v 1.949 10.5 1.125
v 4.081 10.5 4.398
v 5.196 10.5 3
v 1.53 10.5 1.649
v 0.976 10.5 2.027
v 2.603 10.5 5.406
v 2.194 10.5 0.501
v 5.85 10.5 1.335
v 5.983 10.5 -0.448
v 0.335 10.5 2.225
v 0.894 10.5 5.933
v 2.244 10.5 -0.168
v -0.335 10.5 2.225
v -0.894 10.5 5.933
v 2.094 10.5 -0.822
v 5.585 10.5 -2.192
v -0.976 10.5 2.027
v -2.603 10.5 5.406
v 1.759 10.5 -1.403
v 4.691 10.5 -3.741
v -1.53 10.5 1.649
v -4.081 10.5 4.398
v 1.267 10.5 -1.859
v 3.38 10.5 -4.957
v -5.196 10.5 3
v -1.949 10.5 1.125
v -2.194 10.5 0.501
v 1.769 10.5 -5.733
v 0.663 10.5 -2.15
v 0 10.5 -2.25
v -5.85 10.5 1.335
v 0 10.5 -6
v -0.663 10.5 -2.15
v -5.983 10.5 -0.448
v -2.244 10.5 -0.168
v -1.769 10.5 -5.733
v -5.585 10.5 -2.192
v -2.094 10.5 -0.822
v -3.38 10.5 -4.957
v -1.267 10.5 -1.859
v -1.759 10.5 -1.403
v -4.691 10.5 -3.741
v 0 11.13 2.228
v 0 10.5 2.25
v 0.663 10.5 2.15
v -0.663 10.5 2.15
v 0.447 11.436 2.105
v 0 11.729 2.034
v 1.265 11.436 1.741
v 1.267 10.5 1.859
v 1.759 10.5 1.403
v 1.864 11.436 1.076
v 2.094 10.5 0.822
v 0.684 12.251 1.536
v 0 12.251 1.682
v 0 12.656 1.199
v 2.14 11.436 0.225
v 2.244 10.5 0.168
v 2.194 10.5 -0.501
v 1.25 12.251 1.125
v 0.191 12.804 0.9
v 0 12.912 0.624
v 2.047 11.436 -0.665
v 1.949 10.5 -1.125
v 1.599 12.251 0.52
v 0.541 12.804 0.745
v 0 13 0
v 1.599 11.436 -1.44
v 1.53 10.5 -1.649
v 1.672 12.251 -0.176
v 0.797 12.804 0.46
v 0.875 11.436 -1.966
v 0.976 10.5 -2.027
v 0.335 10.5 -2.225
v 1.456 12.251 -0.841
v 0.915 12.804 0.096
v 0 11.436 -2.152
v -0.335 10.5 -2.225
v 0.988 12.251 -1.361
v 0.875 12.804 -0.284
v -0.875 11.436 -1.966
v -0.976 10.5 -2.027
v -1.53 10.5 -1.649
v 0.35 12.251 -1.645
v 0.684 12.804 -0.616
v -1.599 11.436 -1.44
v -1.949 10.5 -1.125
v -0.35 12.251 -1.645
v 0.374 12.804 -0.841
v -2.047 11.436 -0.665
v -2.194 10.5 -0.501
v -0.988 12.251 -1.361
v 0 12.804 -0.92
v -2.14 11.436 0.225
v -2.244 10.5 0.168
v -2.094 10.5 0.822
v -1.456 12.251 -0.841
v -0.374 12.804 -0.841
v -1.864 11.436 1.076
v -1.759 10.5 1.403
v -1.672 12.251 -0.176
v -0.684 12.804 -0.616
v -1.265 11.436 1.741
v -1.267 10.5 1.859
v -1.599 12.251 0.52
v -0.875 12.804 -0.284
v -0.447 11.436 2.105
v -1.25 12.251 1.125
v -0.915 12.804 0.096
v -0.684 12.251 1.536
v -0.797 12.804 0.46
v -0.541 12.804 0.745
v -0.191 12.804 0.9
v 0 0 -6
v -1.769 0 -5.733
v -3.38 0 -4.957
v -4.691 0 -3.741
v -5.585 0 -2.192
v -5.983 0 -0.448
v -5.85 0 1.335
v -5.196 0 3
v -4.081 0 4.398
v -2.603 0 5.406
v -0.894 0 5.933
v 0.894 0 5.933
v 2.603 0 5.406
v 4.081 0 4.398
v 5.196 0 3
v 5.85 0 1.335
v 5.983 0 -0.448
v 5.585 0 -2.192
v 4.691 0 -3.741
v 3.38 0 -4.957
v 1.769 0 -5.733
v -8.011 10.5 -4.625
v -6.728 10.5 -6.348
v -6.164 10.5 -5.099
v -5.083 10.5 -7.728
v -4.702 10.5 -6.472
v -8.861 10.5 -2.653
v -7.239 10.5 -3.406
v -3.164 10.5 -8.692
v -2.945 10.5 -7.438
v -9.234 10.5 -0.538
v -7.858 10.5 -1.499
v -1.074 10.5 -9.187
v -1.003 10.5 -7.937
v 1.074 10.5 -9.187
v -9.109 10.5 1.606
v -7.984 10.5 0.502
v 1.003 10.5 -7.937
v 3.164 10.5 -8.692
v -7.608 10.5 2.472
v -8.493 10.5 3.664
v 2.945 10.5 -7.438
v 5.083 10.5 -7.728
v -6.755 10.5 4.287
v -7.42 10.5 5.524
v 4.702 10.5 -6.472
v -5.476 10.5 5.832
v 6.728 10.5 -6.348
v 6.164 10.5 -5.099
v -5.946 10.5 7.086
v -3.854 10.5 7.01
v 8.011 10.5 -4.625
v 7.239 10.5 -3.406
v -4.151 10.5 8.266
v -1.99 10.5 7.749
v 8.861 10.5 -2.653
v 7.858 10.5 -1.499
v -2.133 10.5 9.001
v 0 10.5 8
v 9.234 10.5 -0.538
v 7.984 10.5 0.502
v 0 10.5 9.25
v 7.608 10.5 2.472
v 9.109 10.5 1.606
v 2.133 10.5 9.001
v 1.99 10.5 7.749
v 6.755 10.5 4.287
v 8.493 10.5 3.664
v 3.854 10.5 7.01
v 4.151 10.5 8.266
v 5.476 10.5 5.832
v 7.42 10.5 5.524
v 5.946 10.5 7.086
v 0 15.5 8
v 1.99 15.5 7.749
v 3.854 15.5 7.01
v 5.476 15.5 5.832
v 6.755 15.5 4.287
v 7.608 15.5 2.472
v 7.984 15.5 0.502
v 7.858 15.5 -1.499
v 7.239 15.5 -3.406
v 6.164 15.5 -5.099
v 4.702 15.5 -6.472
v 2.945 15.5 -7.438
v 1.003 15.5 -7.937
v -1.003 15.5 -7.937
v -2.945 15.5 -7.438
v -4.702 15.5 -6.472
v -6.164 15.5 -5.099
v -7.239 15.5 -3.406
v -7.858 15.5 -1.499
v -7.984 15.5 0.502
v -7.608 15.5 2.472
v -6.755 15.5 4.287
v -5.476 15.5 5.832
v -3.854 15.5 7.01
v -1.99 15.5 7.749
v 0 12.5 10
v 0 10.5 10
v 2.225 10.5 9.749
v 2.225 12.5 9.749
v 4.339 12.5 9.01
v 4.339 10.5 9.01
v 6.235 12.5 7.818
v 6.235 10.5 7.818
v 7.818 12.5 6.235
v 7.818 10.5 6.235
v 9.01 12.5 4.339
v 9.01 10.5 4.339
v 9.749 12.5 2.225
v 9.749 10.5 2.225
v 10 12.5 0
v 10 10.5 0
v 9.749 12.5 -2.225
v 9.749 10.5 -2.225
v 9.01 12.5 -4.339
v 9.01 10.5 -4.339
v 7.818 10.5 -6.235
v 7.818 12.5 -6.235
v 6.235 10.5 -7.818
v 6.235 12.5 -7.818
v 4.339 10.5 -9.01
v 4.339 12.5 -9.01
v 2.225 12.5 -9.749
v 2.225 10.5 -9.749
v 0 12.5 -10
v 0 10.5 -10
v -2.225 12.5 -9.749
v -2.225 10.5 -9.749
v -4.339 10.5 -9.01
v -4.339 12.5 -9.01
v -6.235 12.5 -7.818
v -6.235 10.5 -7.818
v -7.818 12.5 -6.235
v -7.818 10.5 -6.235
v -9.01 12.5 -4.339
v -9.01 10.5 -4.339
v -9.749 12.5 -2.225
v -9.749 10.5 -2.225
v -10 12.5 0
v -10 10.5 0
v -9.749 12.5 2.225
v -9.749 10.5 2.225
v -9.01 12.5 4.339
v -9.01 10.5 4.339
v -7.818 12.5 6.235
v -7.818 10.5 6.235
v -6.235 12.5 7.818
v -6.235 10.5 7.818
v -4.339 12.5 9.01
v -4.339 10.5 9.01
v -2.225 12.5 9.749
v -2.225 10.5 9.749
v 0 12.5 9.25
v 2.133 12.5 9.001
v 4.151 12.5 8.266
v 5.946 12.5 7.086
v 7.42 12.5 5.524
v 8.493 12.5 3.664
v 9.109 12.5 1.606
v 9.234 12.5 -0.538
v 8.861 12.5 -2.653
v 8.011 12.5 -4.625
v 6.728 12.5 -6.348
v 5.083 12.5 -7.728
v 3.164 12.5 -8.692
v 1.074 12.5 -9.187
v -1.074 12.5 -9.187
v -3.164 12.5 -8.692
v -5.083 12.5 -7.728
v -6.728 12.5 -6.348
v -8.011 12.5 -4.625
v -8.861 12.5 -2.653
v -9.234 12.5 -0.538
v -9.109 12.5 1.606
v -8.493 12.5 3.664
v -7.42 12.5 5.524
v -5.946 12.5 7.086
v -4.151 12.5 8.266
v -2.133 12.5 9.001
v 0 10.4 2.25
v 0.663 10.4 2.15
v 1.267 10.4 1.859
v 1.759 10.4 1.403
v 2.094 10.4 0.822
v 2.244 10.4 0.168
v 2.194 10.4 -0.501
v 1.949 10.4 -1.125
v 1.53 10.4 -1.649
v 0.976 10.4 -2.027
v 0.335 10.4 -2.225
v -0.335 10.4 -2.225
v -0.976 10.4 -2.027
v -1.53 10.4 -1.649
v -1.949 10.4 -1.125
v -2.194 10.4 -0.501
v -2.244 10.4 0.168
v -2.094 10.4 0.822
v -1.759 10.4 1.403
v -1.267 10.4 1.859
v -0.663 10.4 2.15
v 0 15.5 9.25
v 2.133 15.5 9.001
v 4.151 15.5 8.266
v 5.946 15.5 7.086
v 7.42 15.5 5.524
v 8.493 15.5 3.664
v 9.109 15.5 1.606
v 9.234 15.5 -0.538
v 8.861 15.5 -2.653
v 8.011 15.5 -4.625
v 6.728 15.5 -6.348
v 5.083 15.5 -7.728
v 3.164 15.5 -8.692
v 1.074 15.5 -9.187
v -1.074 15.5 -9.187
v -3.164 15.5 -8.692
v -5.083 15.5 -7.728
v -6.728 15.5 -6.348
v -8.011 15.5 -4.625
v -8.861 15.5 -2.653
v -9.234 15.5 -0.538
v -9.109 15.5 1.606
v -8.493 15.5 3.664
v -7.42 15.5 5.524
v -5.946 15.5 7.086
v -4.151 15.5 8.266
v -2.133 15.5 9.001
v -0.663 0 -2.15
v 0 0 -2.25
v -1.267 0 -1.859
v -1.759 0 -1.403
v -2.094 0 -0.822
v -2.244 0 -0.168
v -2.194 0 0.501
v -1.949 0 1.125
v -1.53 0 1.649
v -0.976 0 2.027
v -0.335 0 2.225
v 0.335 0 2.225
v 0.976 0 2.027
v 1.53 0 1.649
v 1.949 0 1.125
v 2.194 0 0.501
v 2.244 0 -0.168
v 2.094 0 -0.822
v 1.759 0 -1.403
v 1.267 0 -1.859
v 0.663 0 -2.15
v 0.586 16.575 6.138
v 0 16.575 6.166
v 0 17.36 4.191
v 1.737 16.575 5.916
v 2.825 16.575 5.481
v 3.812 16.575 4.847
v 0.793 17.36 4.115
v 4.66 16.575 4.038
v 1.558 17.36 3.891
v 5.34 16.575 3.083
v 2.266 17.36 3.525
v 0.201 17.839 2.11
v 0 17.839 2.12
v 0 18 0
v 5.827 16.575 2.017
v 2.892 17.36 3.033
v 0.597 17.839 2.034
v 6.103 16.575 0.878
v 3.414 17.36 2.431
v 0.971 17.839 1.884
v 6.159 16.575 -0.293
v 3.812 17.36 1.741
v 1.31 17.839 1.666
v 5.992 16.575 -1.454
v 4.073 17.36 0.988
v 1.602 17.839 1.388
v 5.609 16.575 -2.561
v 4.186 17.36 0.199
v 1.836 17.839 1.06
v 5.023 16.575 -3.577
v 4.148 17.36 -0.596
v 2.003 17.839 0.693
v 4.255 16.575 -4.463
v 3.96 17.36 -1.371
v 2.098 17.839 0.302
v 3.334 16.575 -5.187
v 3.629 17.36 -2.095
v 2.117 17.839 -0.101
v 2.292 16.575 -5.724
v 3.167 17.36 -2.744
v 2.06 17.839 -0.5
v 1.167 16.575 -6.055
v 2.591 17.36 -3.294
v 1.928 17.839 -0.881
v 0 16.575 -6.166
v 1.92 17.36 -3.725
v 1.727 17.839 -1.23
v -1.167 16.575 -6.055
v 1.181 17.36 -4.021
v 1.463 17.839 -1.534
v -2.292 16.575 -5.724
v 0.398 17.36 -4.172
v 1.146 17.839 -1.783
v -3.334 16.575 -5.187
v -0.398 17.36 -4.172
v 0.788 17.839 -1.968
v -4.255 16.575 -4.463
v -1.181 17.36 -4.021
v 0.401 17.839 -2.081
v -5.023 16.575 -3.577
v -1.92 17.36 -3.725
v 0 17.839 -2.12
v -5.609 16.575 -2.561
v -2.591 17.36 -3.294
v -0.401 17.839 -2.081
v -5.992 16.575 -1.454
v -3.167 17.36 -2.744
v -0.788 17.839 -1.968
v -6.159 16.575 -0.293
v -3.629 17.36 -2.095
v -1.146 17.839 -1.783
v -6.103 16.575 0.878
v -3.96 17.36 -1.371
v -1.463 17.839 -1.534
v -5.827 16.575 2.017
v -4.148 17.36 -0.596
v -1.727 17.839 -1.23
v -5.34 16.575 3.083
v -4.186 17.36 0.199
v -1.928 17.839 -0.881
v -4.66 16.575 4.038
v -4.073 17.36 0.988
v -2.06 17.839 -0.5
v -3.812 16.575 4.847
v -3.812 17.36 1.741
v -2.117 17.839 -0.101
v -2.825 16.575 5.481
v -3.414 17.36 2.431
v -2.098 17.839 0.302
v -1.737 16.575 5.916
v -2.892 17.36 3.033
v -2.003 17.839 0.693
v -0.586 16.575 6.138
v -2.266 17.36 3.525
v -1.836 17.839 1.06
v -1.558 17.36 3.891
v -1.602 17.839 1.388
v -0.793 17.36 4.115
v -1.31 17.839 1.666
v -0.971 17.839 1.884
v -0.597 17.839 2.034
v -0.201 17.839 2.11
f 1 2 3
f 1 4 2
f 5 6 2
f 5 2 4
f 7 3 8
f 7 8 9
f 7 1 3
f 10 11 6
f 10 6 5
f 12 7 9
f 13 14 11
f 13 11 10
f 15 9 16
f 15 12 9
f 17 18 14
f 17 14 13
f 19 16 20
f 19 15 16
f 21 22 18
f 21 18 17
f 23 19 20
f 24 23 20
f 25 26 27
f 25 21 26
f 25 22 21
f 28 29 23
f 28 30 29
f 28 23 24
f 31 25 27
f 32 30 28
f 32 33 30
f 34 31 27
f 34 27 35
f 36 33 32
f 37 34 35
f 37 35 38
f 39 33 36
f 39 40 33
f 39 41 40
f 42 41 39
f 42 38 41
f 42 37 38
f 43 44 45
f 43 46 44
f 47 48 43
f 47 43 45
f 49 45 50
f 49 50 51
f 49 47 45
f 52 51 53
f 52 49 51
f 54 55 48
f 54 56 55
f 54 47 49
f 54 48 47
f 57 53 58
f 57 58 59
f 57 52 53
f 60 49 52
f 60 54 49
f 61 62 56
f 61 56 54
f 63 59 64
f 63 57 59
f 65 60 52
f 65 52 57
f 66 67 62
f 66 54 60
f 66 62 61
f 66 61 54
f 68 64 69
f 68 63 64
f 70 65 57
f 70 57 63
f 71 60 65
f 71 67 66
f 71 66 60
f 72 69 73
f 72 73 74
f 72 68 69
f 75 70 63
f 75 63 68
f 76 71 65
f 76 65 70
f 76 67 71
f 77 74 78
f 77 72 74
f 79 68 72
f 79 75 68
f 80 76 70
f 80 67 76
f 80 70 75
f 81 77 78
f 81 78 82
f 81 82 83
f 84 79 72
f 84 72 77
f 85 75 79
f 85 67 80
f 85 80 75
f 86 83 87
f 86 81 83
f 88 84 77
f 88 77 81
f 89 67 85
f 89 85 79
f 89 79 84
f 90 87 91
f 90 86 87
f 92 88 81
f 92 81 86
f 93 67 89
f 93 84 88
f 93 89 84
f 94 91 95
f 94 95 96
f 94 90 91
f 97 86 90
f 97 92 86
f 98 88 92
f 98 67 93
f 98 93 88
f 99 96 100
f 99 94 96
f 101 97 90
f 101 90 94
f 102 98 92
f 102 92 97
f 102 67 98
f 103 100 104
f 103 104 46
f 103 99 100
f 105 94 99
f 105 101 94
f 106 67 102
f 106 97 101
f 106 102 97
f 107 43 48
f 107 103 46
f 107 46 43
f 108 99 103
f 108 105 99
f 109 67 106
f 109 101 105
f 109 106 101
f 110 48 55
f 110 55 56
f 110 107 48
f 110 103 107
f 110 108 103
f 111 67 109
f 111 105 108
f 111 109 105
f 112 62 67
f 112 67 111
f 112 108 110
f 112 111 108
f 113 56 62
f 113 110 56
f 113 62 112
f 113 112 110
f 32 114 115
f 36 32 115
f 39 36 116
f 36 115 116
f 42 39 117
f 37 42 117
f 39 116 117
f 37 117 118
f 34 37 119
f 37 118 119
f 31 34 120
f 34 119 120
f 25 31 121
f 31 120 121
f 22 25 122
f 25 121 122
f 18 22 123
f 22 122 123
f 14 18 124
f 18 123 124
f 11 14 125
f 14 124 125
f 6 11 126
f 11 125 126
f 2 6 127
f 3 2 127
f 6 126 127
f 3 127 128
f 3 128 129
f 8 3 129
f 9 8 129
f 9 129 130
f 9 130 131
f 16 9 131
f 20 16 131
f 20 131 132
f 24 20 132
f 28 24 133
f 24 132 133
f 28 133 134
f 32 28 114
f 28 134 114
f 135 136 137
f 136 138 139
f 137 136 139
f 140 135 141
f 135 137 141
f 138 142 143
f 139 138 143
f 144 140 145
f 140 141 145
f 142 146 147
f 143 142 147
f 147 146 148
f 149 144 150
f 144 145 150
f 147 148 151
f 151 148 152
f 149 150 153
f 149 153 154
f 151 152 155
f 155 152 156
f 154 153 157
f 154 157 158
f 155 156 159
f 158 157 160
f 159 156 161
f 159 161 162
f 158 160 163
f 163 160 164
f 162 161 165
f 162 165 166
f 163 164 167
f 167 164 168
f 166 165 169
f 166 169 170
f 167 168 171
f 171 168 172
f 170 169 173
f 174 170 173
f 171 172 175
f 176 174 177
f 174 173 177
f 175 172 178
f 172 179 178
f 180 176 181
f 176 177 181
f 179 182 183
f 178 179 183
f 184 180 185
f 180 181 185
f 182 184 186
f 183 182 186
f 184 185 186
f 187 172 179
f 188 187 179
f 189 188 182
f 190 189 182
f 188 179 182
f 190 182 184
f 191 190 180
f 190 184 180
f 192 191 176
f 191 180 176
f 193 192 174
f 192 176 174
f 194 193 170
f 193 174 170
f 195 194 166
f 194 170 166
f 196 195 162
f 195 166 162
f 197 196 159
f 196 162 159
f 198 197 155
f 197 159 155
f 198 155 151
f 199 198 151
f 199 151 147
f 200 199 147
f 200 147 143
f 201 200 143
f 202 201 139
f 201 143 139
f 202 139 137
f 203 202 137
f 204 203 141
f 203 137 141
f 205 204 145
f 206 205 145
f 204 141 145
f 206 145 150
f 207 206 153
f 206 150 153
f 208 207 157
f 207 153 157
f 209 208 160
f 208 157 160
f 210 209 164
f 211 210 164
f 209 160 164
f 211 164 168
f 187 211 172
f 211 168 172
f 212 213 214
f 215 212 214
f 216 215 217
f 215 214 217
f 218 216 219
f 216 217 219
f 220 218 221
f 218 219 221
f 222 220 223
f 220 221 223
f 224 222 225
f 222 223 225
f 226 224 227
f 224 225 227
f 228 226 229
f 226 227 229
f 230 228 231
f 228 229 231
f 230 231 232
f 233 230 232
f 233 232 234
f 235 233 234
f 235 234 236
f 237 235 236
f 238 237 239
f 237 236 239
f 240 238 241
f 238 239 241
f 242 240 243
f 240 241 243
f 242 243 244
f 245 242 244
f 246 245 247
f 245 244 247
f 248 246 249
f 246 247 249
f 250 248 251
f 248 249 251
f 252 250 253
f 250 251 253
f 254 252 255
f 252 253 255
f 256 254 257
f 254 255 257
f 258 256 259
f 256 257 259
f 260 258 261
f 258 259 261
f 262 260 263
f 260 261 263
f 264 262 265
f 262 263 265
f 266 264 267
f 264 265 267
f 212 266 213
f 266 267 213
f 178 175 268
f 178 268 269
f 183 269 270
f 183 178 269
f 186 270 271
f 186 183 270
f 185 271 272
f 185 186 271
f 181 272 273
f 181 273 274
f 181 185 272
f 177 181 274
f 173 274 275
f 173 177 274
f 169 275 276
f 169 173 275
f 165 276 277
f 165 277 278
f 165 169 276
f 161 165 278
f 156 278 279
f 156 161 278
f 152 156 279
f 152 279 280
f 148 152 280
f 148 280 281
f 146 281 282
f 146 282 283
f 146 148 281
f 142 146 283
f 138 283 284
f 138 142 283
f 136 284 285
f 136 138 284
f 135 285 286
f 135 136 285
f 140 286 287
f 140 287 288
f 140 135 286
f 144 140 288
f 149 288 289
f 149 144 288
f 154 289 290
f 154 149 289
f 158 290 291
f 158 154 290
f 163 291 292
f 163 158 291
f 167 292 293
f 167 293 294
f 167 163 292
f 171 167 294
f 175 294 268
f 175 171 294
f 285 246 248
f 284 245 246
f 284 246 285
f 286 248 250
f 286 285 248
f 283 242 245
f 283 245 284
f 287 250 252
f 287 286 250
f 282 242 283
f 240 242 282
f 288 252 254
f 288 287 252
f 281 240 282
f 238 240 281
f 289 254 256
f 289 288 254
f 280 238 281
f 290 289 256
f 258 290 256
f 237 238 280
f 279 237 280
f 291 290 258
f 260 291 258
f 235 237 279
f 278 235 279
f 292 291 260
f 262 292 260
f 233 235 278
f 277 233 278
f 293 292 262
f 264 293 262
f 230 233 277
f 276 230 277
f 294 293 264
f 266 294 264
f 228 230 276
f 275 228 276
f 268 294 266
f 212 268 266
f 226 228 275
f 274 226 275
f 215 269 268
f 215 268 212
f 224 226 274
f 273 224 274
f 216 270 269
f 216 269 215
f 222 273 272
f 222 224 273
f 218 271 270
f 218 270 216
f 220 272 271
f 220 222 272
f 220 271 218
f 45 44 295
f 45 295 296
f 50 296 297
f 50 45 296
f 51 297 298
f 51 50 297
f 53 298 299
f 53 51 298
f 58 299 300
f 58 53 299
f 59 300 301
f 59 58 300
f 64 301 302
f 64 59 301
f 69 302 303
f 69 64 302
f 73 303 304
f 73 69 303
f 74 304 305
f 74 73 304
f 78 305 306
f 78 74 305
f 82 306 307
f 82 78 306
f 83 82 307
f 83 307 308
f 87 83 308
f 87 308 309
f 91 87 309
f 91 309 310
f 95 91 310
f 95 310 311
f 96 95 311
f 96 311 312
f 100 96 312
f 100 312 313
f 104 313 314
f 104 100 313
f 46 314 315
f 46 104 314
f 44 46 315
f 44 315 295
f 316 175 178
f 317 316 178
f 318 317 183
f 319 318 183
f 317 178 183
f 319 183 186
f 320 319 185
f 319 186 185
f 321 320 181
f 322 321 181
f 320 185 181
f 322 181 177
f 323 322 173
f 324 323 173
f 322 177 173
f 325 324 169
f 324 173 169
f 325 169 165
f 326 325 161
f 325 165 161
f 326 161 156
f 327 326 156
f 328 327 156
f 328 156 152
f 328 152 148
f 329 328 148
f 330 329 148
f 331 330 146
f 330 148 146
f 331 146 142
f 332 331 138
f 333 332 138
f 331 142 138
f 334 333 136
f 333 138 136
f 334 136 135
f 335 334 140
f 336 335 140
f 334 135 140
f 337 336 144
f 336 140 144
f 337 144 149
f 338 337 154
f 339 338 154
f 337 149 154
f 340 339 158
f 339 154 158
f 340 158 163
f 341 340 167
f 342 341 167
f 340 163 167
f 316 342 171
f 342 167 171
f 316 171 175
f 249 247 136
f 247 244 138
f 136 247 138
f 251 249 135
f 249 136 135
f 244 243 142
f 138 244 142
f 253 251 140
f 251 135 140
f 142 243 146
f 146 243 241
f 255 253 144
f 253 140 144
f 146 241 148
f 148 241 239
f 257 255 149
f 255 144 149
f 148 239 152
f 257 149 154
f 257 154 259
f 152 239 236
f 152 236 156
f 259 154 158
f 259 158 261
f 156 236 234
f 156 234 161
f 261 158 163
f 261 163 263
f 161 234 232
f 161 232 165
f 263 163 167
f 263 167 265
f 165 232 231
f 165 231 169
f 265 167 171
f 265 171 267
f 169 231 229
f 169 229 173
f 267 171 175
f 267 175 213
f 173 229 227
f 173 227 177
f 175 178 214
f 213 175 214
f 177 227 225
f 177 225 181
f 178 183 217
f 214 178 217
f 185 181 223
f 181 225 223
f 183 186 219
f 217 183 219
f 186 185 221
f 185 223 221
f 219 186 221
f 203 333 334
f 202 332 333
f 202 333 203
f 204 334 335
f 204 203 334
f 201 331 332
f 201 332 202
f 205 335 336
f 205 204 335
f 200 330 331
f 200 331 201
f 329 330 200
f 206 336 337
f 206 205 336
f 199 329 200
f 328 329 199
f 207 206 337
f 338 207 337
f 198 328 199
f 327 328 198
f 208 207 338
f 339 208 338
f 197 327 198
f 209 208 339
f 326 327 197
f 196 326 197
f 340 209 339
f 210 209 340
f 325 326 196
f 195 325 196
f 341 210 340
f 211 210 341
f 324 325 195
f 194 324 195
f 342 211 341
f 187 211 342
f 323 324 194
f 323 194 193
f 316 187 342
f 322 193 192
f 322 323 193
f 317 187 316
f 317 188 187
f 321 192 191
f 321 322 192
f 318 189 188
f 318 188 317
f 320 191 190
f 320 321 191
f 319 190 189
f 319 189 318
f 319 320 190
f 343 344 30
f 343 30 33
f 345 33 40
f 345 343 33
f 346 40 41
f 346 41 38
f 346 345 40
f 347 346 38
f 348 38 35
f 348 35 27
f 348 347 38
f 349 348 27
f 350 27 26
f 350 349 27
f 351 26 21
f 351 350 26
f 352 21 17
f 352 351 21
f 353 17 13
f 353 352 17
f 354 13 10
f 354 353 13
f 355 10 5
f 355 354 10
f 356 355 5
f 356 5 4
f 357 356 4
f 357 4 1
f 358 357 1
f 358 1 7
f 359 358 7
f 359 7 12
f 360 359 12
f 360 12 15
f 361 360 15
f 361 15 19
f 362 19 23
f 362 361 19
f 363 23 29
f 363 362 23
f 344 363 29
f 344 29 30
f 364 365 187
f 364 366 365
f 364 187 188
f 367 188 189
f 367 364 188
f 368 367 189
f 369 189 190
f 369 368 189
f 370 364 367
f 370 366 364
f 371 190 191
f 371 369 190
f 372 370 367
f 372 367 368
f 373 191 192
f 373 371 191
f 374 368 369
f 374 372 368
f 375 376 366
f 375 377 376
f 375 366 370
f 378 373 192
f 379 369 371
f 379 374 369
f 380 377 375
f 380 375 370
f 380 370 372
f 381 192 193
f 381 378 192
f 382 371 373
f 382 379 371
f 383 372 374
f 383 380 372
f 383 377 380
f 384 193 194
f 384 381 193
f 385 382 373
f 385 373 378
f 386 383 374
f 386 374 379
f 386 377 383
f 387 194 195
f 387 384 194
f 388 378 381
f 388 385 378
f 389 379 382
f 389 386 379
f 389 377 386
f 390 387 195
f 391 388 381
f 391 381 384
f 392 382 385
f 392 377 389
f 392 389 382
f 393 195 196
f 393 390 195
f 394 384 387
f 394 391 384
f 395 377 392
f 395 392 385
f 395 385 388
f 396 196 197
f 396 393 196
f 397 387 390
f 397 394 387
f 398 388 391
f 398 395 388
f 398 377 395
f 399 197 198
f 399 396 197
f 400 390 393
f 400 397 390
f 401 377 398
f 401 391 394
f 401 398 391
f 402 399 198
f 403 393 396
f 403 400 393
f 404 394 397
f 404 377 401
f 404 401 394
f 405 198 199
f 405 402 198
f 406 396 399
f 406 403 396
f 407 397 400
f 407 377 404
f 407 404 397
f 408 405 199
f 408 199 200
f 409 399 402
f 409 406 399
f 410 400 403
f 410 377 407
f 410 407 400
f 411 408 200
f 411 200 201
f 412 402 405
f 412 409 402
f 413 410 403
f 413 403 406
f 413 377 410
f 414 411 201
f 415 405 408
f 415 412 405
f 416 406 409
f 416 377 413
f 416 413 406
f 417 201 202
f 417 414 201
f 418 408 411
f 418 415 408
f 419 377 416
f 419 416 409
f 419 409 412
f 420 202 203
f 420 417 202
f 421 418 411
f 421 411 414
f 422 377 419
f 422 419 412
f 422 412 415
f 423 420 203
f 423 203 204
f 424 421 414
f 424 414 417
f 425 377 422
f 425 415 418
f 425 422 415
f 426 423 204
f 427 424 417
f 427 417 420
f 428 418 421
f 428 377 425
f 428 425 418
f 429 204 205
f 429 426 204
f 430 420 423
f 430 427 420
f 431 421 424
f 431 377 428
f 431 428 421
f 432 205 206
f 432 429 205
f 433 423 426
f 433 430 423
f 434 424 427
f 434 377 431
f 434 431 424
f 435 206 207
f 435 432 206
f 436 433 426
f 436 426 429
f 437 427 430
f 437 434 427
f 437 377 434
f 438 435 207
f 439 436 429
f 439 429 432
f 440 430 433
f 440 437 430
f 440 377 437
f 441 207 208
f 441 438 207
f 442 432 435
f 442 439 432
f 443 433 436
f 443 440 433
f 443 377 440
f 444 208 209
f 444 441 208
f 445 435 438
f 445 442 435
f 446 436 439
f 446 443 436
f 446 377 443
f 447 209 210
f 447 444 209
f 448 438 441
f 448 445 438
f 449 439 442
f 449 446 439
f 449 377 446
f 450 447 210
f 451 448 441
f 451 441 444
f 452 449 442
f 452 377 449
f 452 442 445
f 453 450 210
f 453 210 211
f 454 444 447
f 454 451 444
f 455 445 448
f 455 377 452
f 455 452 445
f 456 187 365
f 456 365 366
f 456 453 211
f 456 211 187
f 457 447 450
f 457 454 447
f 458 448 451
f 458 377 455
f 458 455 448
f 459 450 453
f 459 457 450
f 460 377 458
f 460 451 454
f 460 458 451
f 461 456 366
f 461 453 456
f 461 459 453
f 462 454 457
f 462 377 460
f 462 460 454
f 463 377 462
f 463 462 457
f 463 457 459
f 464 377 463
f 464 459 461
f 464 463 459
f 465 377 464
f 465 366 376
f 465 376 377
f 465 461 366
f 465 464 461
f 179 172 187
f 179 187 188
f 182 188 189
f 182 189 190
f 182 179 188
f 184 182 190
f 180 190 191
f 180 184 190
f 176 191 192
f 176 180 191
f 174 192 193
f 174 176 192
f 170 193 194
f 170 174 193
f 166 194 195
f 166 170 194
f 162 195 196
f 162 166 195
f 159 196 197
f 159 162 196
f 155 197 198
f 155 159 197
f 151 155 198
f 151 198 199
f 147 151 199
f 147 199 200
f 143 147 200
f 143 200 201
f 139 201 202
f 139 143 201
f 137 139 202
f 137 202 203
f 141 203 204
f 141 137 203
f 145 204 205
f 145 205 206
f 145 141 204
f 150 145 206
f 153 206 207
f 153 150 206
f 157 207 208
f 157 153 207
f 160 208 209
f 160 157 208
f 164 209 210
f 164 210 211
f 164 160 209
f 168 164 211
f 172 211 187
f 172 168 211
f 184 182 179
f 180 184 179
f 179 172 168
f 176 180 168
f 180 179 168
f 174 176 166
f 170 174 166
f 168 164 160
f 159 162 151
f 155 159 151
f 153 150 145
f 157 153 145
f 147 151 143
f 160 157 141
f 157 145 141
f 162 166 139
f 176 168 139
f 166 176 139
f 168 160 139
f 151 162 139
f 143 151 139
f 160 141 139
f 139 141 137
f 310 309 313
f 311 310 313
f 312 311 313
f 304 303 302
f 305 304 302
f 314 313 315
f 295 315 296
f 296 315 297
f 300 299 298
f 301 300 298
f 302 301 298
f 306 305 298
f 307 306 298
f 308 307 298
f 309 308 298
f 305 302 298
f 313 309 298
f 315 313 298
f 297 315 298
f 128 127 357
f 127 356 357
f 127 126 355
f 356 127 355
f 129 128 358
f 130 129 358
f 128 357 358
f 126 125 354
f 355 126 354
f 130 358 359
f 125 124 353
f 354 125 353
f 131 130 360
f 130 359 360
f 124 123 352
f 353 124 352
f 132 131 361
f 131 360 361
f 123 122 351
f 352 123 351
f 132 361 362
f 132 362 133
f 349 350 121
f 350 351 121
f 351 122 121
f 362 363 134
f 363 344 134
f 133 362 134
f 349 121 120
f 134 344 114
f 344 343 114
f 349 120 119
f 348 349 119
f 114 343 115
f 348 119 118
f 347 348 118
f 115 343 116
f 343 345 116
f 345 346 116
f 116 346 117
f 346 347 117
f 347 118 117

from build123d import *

# Parameters (mm, degrees)
SKETCH1_R           = 6
SKETCH1_R_2         = 2.25
BOSS_EXTRUDE1_DEPTH = 10.5
SKETCH2_R           = 9.25
SKETCH2_R_2         = 8
BOSS_EXTRUDE2_DEPTH = 5
SKETCH2_6_R         = 8
SKETCH2_6_R_2       = 6
SKETCH2_6_R_3       = 2.25
BOSS_EXTRUDE4_DEPTH = 5
SKETCH2_8_R         = 2.25
BOSS_EXTRUDE7_DEPTH = 0.1
SKETCH2_10_R        = 10
SKETCH2_10_R_2      = 9.25
BOSS_EXTRUDE8_DEPTH = 2
DOME2_FACE_RADIUS   = 2.25
DOME2_HEIGHT        = 2.5
DOME1_FACE_RADIUS   = 8
DOME1_HEIGHT        = 2.5


with BuildPart() as part:
    # Sketch1 → Boss-Extrude1 (new body)
    with BuildSketch(Plane(origin=(0, 0, 0), x_dir=(1, 0, 0), z_dir=(0, 1, 0))):
        with Locations(Location((0, 0, 0), (0, 0, 90))):
            Circle(SKETCH1_R)
        with Locations(Location((0, 0, 0), (0, 0, 90))):
            Circle(SKETCH1_R_2, mode=Mode.SUBTRACT)
    extrude(amount=BOSS_EXTRUDE1_DEPTH)


with BuildPart() as body_2:
    # Sketch2 → Boss-Extrude2 (new body)
    with BuildSketch(Plane(origin=(0, 10.5, 0), x_dir=(1, 0, 0), z_dir=(0, 1, 0))):
        with Locations(Location((0, 0, 0), (0, 0, 270))):
            Circle(SKETCH2_R)
        with Locations(Location((0, 0, 0), (0, 0, 270))):
            Circle(SKETCH2_R_2, mode=Mode.SUBTRACT)
    extrude(amount=BOSS_EXTRUDE2_DEPTH)


with BuildPart() as body_3:
    # Sketch2<6> → Boss-Extrude4 (new body)
    # profile 1 of 3: a face of its own
    with BuildSketch(Plane(origin=(0, 10.5, 0), x_dir=(1, 0, 0), z_dir=(0, 1, 0))):
        with Locations(Location((0, 0, 0), (0, 0, 270))):
            Circle(SKETCH2_6_R)
        with Locations(Location((0, 0, 0), (0, 0, 90))):
            Circle(SKETCH2_6_R_2, mode=Mode.SUBTRACT)
    # profile 2 of 3: a face of its own
    with BuildSketch(Plane(origin=(0, 10.5, 0), x_dir=(1, 0, 0), z_dir=(0, 1, 0))):
        with Locations(Location((0, 0, 0), (0, 0, 90))):
            Circle(SKETCH2_6_R_2)
        with Locations(Location((0, 0, 0), (0, 0, 90))):
            Circle(SKETCH2_6_R_3, mode=Mode.SUBTRACT)
    # profile 3 of 3: a face of its own
    with BuildSketch(Plane(origin=(0, 10.5, 0), x_dir=(1, 0, 0), z_dir=(0, 1, 0))):
        with Locations(Location((0, 0, 0), (0, 0, 90))):
            Circle(SKETCH2_6_R_3)
    extrude(amount=BOSS_EXTRUDE4_DEPTH)

    # Dome1: a dome of height H over a round flat face of radius A is a cap of a sphere of radius (A * A + H * H) / (2 * H)
    dome1_r = (DOME1_FACE_RADIUS * DOME1_FACE_RADIUS + DOME1_HEIGHT * DOME1_HEIGHT) / (2 * DOME1_HEIGHT)
    dome1_base = Plane((0, 15.5, 0), z_dir=(0, 1, 0))
    with Locations(dome1_base.offset(DOME1_HEIGHT - dome1_r)):
        dome1_ball = Sphere(dome1_r, mode=Mode.PRIVATE)
    add(split(dome1_ball, bisect_by=dome1_base, keep=Keep.TOP, mode=Mode.PRIVATE))


with BuildPart() as body_4:
    # Sketch2<8> → Boss-Extrude7 (new body)
    with BuildSketch(Plane(origin=(0, 10.5, 0), x_dir=(1, 0, 0), z_dir=(0, 1, 0))):
        with Locations(Location((0, 0, 0), (0, 0, 270))):
            Circle(SKETCH2_8_R)
    extrude(amount=-BOSS_EXTRUDE7_DEPTH)

    # Dome2: a dome of height H over a round flat face of radius A is a cap of a sphere of radius (A * A + H * H) / (2 * H)
    dome2_r = (DOME2_FACE_RADIUS * DOME2_FACE_RADIUS + DOME2_HEIGHT * DOME2_HEIGHT) / (2 * DOME2_HEIGHT)
    dome2_base = Plane((0, 10.5, 0), z_dir=(0, 1, 0))
    with Locations(dome2_base.offset(DOME2_HEIGHT - dome2_r)):
        dome2_ball = Sphere(dome2_r, mode=Mode.PRIVATE)
    add(split(dome2_ball, bisect_by=dome2_base, keep=Keep.TOP, mode=Mode.PRIVATE))


with BuildPart() as body_5:
    # Sketch2<10> → Boss-Extrude8 (new body)
    with BuildSketch(Plane(origin=(0, 10.5, 0), x_dir=(1, 0, 0), z_dir=(0, 1, 0))):
        with Locations(Location((0, 0, 0), (0, 0, 270))):
            Circle(SKETCH2_10_R)
        with Locations(Location((0, 0, 0), (0, 0, 270))):
            Circle(SKETCH2_10_R_2, mode=Mode.SUBTRACT)
    extrude(amount=BOSS_EXTRUDE8_DEPTH)


solid = Compound([part.part, body_2.part, body_3.part, body_4.part, body_5.part])
